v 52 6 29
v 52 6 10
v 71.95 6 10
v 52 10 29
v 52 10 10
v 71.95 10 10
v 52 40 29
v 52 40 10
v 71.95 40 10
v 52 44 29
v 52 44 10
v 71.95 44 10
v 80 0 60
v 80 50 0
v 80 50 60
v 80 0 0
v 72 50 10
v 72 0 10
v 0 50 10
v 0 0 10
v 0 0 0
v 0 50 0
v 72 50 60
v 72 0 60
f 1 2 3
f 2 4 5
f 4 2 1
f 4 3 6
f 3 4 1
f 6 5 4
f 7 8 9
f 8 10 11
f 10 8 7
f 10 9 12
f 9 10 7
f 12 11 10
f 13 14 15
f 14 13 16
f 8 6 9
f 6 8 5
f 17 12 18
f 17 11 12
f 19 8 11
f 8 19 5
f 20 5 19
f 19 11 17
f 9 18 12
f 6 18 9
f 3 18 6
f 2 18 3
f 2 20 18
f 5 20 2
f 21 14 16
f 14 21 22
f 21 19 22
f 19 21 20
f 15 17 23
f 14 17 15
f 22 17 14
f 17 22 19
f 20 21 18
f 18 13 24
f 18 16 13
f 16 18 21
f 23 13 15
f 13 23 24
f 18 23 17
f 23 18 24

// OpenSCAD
$fn = 32;

// ----------------------------------------------------------------------
// Rib bracket: 2-gusset L bracket
// ----------------------------------------------------------------------

// --- parameters (mm) ---
base_l = 80;              // foot length, X
base_w = 50;              // foot width, Y
base_t = 10;              // foot thickness
plate_t = 8;              // upright plate thickness
plate_h = 60;             // overall height
gus_l = 20;               // gusset leg along the foot
gus_h = 20;               // gusset height
gus_t = 4;                // gusset thickness
gus_edge = 6;             // gusset margin from the foot edge
n_gus = 2;                // gusset count

gus_pitch = (base_w - 2 * gus_edge - gus_t) / (n_gus - 1);  // gusset pitch

union() {
  cube([base_l, base_w, base_t]);
  translate([base_l - plate_t, 0, base_t - 1])
    cube([plate_t, base_w, plate_h - base_t + 1]);
  for (i = [0 : n_gus - 1])
    translate([base_l - plate_t - gus_l, gus_edge + i * gus_pitch, base_t - 1])
      rotate([-90, 0, 0])
        linear_extrude(height = gus_t)
          polygon(points = [[0, 0], [gus_l + 1, 0], [0, -gus_h]]);
}
